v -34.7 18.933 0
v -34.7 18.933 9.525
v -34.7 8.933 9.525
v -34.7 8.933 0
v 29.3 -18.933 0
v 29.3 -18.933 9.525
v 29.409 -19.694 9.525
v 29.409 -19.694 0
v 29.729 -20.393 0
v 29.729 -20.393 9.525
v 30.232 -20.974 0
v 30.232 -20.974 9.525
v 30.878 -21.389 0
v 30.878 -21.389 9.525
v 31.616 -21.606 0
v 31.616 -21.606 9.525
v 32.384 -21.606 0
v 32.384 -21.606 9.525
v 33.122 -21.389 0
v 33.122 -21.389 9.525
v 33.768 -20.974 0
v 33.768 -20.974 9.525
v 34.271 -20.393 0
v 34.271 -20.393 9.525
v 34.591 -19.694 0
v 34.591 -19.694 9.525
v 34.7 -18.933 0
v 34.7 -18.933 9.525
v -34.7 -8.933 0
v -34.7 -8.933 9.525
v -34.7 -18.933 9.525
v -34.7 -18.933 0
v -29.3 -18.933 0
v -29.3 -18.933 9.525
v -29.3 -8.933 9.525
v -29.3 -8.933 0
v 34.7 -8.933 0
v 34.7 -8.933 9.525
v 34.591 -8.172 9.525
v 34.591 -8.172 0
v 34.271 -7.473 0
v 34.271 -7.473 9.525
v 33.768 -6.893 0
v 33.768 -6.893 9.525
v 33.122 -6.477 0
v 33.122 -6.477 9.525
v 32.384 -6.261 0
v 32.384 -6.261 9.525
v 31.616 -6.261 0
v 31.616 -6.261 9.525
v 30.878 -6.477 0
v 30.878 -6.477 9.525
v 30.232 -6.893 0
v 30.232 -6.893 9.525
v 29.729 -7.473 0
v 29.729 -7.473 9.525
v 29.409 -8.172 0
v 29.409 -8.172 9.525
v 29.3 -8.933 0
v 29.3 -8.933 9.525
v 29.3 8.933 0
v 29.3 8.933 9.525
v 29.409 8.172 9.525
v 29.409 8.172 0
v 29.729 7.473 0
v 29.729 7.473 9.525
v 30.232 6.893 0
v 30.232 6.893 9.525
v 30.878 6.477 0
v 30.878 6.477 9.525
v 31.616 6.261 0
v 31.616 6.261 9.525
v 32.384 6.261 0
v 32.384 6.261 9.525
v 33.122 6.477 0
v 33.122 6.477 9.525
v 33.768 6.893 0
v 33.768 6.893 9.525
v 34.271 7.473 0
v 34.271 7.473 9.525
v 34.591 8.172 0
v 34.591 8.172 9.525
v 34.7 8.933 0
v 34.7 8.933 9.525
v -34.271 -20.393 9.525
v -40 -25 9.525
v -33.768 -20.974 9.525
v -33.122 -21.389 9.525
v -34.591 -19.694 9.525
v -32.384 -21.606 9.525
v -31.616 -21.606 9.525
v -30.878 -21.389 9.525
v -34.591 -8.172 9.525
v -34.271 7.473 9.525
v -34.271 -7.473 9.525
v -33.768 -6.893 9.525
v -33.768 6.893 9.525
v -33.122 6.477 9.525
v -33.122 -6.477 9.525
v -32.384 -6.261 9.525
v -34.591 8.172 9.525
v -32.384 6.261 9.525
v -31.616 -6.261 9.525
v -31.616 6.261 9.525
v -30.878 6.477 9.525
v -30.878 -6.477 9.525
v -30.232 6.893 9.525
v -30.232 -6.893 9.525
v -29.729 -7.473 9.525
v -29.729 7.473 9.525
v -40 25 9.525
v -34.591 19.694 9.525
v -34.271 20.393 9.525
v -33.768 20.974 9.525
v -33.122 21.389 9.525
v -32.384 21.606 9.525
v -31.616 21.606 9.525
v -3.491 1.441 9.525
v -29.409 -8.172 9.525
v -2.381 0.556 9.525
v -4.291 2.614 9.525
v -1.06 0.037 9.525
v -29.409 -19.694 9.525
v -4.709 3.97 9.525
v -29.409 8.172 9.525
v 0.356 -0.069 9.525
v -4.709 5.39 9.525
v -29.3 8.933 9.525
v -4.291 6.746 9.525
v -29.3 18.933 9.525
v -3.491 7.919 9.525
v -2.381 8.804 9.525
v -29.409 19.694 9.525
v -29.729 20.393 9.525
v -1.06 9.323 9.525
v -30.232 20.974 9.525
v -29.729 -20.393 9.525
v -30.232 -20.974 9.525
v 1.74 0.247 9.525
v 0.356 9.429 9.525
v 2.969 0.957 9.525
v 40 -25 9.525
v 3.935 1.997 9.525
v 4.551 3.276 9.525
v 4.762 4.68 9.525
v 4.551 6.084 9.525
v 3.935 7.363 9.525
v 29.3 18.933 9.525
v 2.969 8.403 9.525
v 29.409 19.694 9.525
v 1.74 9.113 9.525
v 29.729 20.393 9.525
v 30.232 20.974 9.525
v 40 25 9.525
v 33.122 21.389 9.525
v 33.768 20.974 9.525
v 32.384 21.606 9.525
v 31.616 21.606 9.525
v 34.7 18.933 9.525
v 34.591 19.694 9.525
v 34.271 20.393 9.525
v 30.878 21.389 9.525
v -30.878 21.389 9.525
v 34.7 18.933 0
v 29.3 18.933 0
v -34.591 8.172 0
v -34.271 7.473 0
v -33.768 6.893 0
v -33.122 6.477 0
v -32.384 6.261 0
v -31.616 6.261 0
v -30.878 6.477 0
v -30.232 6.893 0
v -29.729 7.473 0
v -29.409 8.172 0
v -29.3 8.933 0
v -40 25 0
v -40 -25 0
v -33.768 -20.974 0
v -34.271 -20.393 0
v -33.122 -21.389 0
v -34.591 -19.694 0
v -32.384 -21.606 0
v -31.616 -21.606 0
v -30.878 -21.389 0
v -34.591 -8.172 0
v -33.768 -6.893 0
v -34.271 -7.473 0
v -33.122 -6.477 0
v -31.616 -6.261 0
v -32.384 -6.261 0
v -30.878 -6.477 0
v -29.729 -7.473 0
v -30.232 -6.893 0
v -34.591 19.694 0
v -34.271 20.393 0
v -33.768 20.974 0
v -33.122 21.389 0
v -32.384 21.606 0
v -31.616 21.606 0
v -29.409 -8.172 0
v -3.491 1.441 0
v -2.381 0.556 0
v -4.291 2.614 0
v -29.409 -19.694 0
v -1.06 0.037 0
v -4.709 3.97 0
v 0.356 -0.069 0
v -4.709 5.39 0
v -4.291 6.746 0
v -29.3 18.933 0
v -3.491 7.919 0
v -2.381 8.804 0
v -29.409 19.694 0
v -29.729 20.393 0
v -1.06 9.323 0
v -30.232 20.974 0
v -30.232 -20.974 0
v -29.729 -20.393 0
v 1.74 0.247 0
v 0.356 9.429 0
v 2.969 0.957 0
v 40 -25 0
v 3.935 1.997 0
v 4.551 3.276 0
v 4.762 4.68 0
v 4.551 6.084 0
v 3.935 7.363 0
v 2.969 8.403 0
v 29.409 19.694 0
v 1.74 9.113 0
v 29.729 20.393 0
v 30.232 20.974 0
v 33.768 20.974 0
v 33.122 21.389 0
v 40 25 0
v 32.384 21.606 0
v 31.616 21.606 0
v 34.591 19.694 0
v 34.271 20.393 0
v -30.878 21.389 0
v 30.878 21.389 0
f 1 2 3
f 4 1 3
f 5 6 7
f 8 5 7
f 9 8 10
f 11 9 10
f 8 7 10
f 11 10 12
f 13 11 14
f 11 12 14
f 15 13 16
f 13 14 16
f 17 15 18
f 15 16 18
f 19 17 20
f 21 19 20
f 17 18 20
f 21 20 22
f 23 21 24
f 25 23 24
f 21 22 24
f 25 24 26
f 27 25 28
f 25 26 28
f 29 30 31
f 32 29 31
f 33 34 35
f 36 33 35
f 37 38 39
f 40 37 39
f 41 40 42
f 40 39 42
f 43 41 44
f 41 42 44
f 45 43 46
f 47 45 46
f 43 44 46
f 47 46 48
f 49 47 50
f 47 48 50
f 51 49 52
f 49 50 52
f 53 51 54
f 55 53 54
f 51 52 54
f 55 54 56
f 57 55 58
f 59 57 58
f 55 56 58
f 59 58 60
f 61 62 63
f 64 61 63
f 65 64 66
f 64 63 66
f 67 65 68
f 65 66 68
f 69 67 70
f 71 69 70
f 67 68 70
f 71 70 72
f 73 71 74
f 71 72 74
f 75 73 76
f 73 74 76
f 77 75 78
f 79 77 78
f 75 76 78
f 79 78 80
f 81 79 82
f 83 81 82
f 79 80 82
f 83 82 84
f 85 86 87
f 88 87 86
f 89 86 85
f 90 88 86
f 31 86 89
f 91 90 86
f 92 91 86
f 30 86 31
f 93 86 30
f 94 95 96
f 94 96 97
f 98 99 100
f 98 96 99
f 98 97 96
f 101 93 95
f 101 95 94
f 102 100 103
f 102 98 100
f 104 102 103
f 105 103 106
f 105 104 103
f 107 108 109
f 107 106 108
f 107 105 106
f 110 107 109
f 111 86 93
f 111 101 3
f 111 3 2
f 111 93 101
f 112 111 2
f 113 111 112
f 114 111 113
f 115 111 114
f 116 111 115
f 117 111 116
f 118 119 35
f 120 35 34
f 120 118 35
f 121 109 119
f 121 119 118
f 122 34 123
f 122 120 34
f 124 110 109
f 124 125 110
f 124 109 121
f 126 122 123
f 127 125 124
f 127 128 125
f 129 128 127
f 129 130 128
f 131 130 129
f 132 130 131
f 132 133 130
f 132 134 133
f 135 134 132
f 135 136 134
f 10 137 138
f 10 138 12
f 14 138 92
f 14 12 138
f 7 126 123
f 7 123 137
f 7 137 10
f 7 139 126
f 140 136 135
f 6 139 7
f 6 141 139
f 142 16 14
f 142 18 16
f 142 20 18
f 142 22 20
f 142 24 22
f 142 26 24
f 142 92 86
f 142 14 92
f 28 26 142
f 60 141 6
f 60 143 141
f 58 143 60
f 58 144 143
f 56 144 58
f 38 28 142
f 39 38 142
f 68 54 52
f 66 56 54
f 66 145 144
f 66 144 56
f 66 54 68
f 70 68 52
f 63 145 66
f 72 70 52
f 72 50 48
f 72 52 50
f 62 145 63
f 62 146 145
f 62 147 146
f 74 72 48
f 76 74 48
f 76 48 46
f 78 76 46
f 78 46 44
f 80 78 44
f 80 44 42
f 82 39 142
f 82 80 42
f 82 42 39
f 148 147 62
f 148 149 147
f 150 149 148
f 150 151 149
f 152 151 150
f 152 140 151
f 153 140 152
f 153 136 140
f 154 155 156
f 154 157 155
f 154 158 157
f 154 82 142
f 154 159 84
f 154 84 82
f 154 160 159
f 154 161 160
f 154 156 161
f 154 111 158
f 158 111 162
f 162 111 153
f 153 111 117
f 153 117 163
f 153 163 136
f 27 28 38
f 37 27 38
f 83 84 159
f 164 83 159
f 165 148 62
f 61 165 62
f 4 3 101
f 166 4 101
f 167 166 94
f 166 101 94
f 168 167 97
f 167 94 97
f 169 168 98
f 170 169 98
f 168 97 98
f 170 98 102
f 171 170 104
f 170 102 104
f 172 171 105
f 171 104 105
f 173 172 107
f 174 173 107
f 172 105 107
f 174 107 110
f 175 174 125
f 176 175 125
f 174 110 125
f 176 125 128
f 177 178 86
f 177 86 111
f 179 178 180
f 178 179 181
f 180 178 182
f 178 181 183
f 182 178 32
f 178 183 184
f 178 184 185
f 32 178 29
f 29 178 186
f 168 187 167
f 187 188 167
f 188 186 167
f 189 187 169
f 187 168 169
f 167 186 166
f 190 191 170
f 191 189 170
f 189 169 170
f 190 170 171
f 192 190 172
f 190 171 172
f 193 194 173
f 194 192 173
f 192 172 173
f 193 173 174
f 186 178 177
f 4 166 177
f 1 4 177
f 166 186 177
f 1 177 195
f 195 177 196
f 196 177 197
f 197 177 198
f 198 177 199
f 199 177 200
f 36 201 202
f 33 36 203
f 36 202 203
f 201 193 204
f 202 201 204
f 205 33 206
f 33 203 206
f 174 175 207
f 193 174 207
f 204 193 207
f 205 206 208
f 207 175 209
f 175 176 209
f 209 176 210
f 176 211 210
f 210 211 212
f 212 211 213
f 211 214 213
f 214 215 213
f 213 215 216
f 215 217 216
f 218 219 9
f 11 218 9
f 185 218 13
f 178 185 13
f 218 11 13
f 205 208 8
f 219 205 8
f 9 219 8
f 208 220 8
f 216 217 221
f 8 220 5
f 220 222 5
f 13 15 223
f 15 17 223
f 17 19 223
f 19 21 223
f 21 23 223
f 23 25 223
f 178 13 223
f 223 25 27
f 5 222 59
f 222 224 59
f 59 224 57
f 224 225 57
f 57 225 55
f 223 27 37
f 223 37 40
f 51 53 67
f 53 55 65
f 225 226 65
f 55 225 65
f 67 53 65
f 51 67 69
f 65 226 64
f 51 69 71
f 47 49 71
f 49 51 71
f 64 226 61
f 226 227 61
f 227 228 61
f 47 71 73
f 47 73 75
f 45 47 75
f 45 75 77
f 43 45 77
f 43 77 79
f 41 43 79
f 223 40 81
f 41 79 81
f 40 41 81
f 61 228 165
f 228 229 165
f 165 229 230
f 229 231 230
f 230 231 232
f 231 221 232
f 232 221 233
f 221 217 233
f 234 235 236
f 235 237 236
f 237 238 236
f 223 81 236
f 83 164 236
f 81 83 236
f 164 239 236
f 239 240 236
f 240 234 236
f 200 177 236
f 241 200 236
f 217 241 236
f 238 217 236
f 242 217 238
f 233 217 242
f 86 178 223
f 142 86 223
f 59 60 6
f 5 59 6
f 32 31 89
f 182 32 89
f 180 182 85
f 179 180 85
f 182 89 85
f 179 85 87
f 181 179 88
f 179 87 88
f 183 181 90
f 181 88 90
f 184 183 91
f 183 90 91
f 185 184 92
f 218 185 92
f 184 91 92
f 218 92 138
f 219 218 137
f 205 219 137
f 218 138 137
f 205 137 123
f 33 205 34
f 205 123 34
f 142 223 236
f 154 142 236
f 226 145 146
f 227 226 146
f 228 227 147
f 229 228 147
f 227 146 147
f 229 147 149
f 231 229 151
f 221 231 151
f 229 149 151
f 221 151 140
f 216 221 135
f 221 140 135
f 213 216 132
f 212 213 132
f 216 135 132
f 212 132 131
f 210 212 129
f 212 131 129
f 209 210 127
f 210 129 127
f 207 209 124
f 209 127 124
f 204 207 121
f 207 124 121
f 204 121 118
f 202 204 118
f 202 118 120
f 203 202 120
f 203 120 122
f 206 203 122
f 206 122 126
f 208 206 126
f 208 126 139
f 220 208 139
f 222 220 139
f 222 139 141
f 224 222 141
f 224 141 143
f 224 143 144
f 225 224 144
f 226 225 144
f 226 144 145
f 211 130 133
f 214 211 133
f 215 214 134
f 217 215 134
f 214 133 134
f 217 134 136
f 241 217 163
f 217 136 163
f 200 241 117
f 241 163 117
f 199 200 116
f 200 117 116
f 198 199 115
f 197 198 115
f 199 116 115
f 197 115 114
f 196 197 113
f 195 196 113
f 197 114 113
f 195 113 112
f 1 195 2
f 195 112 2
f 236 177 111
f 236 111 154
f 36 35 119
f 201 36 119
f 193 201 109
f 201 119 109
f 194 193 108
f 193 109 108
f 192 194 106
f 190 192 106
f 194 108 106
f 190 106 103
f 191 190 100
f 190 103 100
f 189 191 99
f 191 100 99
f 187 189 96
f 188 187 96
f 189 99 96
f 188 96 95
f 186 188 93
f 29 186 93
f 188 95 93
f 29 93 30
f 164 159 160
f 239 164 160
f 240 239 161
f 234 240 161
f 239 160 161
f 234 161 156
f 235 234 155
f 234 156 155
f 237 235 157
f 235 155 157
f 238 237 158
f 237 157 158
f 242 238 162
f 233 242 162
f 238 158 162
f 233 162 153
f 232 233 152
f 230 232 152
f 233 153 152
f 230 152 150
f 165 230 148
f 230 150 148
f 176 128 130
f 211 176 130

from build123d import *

# Parameters (mm, degrees)
F0_W     = 80
F0_H     = 50
F1_DEPTH = 9.525
F3_DEPTH = 25
F4_R     = 4.7625
F5_DEPTH = 9.526


with BuildPart() as f1:
    # F0 (on Top) → F1 (new body)
    with BuildSketch(Plane.XY):
        Rectangle(F0_W, F0_H)
    extrude(amount=F1_DEPTH)

    # F2 (on face) → F3 (cut)
    with BuildSketch(Plane.XY.offset(9.525)):
        with BuildLine():
            ThreePointArc((-29.3, 18.933095), (-32, 21.633095), (-34.7, 18.933095))
            Line((-34.7, 18.933095), (-34.7, 8.933095))
            ThreePointArc((-34.7, 8.933095), (-32, 6.233095), (-29.3, 8.933095))
            Line((-29.3, 8.933095), (-29.3, 18.933095))
        make_face()
        with BuildLine():
            ThreePointArc((-34.7, -18.933095), (-32, -21.633095), (-29.3, -18.933095))
            Line((-29.3, -18.933095), (-29.3, -8.933095))
            ThreePointArc((-29.3, -8.933095), (-32, -6.233095), (-34.7, -8.933095))
            Line((-34.7, -8.933095), (-34.7, -18.933095))
        make_face()
        with BuildLine():
            ThreePointArc((29.3, -18.933095), (32, -21.633095), (34.7, -18.933095))
            Line((34.7, -18.933095), (34.7, -8.933095))
            ThreePointArc((34.7, -8.933095), (32, -6.233095), (29.3, -8.933095))
            Line((29.3, -8.933095), (29.3, -18.933095))
        make_face()
        with BuildLine():
            ThreePointArc((34.7, 18.933095), (32, 21.633095), (29.3, 18.933095))
            Line((29.3, 18.933095), (29.3, 8.933095))
            ThreePointArc((29.3, 8.933095), (32, 6.233095), (34.7, 8.933095))
            Line((34.7, 8.933095), (34.7, 18.933095))
        make_face()
    extrude(amount=-F3_DEPTH, mode=Mode.SUBTRACT)

    # F4 (on face) → F5 (cut, through all)
    with BuildSketch(Plane.XY.offset(9.525)):
        with Locations((0, 4.68)):
            Circle(F4_R)
    extrude(amount=-F5_DEPTH, mode=Mode.SUBTRACT)


solid = f1.part
